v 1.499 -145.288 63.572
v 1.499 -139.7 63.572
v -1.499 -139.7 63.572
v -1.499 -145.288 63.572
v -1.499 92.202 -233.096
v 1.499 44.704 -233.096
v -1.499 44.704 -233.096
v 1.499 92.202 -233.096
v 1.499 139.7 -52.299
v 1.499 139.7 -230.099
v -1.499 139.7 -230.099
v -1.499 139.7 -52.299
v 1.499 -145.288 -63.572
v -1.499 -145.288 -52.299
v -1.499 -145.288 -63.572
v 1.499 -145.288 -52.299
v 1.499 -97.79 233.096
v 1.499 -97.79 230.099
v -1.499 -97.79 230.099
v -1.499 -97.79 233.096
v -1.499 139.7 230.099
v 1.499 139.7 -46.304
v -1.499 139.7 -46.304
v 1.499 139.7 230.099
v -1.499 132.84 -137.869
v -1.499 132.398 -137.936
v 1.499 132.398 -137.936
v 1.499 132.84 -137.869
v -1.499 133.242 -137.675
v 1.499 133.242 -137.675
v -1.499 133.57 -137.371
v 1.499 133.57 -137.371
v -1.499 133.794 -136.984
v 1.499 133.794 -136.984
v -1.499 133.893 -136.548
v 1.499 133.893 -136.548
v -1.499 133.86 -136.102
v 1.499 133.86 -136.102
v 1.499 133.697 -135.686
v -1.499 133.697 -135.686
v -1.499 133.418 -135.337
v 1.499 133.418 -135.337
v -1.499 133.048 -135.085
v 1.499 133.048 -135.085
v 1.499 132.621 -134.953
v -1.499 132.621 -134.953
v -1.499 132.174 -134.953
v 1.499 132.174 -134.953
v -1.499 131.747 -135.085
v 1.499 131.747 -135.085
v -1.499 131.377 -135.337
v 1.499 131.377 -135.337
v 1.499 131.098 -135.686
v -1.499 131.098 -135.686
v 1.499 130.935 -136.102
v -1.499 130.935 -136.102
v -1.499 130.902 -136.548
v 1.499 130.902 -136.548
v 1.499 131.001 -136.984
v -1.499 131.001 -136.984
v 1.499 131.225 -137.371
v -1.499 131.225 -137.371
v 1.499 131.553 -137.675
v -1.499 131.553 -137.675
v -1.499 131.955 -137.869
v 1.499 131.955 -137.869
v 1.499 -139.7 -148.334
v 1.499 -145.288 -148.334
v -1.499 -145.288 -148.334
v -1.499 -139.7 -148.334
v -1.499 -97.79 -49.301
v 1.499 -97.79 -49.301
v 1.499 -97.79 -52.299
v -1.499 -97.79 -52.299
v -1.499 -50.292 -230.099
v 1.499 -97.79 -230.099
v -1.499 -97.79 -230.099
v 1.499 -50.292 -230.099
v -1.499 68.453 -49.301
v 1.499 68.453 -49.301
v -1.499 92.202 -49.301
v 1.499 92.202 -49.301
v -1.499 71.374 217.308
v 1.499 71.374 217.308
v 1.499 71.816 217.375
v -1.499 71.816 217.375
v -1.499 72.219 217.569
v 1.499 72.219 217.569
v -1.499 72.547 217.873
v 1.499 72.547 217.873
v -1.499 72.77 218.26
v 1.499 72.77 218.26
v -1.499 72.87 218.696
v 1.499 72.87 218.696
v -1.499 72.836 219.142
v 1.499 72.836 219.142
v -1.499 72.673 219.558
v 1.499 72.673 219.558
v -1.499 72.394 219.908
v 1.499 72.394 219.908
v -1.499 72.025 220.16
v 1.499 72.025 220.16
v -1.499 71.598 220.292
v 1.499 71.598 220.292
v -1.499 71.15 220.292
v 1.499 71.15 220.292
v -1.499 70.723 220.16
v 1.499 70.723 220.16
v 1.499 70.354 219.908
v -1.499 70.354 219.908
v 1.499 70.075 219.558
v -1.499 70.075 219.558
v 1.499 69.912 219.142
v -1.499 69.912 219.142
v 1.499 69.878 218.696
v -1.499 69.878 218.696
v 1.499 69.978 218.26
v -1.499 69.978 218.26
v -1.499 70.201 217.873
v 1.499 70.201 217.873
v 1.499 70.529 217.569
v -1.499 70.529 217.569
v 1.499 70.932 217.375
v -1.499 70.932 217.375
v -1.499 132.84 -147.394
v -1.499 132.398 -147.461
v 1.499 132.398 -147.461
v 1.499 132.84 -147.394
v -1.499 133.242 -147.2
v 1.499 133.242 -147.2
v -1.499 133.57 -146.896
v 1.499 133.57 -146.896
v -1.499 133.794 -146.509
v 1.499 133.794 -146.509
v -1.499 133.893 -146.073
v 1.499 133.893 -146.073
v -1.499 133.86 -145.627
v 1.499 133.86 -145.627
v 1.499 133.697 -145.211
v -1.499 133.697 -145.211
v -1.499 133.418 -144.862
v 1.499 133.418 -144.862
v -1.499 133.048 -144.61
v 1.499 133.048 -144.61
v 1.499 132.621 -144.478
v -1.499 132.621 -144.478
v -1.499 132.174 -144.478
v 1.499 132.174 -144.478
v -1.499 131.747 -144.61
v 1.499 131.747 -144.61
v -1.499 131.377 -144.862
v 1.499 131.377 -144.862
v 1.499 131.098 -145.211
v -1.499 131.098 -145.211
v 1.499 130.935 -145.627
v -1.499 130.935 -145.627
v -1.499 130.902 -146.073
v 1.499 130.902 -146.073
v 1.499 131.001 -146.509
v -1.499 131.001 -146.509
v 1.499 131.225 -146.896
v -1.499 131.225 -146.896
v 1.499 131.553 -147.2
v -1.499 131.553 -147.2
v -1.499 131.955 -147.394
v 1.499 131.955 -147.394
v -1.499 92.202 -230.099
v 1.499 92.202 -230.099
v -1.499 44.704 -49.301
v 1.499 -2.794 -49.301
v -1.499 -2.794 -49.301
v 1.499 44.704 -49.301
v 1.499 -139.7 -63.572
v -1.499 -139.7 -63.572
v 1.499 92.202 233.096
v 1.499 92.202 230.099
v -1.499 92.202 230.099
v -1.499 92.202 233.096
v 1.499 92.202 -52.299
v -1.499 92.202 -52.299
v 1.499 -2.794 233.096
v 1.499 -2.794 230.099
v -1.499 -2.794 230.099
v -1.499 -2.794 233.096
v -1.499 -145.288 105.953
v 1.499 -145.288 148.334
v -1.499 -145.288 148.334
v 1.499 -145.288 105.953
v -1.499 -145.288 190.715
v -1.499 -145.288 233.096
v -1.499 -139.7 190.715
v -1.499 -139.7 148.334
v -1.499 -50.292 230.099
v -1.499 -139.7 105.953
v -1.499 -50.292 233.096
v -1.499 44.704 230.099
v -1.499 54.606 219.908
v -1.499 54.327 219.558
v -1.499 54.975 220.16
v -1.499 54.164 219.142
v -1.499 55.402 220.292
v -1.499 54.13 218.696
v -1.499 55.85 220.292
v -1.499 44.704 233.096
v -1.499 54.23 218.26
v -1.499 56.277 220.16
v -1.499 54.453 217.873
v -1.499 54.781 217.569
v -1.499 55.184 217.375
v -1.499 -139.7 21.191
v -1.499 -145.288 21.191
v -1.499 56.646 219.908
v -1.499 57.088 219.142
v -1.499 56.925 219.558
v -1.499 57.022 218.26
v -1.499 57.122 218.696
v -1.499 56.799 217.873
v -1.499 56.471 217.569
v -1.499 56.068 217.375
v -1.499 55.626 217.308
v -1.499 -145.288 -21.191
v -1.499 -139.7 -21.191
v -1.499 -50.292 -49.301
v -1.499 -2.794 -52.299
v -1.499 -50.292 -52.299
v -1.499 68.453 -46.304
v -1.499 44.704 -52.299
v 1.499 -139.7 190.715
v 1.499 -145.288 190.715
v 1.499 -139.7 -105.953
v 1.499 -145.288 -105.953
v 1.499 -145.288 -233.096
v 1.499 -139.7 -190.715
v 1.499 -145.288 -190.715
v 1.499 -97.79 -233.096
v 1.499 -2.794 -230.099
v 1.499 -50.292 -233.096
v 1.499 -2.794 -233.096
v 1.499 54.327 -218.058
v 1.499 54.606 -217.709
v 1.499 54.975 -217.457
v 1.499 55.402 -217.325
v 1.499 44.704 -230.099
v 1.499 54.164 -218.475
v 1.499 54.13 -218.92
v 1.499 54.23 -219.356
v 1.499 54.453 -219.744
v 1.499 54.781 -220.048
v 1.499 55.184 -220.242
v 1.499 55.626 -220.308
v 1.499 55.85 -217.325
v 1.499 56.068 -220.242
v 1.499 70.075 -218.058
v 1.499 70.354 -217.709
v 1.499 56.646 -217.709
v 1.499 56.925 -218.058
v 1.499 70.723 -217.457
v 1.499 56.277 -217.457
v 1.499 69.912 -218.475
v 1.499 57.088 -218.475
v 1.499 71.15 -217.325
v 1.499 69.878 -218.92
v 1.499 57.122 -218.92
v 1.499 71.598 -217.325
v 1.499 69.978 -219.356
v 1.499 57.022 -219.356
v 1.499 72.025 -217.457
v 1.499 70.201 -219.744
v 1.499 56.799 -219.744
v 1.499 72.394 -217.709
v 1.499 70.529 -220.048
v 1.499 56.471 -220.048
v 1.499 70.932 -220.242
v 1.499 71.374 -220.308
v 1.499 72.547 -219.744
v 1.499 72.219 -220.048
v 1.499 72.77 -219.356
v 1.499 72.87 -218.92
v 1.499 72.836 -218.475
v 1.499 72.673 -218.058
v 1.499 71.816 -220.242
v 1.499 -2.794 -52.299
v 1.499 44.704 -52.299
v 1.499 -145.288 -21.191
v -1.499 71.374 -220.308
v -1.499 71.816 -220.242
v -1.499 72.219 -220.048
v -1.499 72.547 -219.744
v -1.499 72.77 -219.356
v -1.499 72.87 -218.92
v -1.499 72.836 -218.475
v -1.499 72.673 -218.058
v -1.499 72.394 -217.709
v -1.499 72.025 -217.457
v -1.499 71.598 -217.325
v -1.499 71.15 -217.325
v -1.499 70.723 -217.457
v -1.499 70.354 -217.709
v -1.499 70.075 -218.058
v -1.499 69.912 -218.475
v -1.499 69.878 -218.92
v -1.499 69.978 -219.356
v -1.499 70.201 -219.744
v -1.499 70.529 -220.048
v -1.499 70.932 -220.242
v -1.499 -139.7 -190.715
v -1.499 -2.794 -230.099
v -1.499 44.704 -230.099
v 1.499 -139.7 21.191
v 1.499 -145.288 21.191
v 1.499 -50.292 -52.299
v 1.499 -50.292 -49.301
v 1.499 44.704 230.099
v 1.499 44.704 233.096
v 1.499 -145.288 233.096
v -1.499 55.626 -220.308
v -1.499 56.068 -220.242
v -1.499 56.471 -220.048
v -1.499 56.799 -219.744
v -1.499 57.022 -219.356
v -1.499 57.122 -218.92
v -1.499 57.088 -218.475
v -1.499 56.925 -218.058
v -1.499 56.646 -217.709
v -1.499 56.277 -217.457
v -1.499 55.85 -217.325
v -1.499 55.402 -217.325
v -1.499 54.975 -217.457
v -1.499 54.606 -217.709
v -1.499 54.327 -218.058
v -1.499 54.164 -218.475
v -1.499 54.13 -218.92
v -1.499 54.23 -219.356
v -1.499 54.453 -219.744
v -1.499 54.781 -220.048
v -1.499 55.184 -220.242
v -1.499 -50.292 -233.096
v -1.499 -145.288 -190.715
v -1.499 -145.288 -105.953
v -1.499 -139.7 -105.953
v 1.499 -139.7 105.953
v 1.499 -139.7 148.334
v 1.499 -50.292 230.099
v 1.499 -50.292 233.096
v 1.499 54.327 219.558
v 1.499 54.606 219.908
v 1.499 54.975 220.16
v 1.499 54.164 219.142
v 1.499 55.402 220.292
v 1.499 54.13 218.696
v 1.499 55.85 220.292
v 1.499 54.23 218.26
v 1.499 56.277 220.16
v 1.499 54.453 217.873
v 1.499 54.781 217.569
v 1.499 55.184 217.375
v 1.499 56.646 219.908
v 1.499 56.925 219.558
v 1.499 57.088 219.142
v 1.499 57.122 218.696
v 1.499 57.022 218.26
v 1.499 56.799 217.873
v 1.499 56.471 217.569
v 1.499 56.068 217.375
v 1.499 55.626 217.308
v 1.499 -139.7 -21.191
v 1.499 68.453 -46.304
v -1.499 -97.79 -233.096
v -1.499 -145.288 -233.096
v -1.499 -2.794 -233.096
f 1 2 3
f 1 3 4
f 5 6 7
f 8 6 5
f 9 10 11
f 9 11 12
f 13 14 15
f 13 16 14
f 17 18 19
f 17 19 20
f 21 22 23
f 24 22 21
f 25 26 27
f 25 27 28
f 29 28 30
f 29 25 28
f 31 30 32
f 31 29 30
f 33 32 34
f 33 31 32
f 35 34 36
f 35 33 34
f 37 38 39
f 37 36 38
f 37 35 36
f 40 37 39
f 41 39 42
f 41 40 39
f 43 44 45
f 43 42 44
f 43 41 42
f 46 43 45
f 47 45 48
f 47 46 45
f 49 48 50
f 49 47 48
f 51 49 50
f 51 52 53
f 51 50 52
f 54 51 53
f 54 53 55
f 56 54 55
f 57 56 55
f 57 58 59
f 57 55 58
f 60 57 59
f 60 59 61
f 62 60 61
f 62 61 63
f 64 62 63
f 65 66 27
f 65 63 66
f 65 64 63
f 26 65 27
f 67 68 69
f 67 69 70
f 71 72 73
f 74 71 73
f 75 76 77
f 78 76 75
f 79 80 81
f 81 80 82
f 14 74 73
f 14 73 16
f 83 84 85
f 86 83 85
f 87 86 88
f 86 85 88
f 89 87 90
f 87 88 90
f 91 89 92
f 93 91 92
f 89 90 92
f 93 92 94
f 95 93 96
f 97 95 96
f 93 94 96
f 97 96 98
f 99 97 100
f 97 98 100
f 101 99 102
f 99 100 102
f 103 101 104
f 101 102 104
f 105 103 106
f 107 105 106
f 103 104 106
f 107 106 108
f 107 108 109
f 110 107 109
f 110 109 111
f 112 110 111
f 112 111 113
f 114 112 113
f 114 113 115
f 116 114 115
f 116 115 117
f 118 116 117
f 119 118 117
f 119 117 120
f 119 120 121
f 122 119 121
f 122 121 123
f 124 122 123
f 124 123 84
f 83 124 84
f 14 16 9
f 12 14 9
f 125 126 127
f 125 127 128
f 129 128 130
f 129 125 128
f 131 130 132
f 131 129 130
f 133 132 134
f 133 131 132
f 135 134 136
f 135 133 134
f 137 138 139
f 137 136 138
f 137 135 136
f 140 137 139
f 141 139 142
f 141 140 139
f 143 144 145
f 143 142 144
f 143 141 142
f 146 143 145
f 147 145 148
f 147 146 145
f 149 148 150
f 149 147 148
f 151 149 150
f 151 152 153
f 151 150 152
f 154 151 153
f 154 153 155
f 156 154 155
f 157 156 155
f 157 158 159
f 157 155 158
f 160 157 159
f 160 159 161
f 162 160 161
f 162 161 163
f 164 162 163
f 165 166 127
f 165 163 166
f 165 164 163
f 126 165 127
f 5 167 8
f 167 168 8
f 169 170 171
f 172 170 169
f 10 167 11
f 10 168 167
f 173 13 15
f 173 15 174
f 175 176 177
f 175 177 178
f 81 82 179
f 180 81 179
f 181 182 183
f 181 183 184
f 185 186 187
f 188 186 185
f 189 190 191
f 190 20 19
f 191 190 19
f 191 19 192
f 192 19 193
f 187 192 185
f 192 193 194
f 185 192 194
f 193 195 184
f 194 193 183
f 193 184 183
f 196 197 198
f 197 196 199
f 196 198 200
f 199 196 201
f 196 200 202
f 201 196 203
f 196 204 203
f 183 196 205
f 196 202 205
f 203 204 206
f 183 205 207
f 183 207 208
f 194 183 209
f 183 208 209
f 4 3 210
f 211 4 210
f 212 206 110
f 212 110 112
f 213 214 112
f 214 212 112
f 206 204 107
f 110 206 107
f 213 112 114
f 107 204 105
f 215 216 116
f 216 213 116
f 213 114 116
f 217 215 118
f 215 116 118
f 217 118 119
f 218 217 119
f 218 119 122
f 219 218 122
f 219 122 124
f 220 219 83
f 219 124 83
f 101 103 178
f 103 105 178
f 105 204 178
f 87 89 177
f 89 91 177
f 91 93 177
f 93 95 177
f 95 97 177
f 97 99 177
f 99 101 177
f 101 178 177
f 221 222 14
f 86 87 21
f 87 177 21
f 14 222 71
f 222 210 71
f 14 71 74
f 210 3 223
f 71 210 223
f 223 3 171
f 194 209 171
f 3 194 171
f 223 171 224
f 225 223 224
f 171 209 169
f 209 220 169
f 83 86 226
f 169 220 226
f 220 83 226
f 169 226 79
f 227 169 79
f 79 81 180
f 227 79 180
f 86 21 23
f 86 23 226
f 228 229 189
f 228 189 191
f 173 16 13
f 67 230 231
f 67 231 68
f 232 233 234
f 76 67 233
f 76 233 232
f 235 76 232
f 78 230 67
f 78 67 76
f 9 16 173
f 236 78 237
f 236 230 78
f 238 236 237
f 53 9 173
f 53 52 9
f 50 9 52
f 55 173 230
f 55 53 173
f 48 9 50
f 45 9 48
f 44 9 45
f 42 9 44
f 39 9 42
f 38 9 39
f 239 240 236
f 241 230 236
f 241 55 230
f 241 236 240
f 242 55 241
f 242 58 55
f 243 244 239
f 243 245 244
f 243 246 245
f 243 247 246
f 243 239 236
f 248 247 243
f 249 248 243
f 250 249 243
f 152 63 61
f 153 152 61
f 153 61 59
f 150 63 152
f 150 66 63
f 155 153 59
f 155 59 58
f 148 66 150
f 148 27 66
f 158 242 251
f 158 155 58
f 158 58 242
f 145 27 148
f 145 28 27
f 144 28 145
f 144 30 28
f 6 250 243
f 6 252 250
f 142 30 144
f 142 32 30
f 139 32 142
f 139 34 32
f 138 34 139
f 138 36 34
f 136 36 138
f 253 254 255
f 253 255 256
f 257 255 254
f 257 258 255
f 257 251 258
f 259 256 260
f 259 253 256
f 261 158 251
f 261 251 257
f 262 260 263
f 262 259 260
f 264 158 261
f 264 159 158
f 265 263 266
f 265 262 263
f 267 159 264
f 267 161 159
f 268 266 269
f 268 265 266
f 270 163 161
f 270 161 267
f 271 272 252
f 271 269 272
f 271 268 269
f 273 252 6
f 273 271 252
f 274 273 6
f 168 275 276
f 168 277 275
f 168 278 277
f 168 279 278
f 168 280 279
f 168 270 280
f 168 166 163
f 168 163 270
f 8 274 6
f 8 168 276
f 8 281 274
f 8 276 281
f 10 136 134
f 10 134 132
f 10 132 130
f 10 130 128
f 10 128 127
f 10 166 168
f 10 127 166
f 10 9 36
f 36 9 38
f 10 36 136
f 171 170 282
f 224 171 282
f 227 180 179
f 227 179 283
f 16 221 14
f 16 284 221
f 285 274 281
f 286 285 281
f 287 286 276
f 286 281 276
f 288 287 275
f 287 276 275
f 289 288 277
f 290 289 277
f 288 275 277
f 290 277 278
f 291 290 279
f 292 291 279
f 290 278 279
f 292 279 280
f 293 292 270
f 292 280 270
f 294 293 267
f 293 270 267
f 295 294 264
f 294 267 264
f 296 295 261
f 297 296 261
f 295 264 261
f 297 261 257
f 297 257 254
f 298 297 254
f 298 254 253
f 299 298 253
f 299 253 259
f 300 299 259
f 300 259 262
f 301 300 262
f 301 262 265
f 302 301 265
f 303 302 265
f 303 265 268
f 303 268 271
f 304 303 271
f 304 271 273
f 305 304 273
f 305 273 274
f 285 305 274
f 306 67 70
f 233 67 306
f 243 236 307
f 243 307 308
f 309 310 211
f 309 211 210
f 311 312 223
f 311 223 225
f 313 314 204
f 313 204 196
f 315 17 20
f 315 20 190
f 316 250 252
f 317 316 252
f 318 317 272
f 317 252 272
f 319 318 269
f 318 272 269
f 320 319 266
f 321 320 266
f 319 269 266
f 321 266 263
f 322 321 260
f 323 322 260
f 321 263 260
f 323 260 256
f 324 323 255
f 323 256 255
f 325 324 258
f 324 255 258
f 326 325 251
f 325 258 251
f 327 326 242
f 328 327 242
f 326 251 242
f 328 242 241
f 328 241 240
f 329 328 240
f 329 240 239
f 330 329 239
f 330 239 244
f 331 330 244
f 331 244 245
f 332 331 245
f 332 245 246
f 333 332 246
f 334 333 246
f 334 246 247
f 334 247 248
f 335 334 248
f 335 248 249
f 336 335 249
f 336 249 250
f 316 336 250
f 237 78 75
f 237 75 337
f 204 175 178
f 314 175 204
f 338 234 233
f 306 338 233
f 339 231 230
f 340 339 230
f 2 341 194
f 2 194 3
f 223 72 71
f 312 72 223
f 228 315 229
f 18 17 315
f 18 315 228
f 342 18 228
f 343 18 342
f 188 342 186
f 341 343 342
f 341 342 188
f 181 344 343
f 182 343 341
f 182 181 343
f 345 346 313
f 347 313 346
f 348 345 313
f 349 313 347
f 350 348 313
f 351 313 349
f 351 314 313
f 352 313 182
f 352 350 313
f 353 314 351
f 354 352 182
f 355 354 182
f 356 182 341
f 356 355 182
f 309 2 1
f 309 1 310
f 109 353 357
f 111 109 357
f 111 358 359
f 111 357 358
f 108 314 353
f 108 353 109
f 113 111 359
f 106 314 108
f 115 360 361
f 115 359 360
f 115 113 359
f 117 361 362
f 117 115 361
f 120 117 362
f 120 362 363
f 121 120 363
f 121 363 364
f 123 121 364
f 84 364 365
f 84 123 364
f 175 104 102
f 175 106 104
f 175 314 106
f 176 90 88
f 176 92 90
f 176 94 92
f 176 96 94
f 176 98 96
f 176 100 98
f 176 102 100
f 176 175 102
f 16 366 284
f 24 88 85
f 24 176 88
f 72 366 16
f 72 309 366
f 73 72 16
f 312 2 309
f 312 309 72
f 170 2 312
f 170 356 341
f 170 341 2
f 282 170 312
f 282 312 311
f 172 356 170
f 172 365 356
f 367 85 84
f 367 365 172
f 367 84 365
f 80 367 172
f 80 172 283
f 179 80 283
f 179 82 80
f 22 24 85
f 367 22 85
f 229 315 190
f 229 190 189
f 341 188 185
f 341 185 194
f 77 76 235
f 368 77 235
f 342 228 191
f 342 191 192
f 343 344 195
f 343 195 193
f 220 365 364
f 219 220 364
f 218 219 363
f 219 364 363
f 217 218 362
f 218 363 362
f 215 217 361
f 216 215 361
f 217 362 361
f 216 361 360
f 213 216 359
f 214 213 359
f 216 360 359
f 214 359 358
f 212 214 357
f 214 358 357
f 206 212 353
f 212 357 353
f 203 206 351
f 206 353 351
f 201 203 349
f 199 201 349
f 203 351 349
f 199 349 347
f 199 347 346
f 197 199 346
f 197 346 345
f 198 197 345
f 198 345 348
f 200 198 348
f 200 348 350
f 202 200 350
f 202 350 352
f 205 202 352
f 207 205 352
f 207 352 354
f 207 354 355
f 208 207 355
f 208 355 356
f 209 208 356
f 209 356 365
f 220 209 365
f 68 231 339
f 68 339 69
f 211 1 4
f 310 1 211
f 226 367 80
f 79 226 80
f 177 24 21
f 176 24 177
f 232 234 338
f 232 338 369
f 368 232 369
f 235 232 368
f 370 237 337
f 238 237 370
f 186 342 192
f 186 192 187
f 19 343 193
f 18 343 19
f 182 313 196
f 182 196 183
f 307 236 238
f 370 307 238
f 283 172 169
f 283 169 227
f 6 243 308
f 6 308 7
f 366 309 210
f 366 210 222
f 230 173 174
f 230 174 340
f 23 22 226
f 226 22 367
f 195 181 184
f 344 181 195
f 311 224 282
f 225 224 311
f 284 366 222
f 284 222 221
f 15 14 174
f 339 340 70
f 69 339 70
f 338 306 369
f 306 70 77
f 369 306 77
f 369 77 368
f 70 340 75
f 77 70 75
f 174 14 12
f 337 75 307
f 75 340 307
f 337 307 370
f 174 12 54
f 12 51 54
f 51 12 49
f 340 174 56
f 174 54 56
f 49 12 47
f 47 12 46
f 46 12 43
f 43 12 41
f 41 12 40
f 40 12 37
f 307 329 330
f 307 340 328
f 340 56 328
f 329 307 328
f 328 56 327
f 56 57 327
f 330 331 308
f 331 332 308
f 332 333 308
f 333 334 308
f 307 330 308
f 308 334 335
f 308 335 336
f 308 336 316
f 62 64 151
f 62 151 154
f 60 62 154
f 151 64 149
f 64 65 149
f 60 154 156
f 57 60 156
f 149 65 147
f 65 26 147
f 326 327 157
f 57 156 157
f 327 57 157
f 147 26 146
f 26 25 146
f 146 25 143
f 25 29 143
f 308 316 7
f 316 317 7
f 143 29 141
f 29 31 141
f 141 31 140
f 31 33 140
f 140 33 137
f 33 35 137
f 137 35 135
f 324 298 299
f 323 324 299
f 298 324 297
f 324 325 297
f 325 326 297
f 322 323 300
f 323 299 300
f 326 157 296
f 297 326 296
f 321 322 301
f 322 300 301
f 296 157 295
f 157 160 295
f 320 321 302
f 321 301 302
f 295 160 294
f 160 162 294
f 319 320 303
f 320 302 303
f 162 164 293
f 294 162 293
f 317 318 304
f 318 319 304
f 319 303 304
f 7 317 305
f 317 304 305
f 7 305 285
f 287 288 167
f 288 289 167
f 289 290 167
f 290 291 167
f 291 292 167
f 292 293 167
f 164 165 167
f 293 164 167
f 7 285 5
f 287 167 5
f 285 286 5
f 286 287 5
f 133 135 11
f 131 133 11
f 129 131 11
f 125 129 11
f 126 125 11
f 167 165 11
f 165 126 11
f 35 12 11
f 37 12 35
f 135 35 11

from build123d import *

# Parameters (mm, degrees)
BOSS_EXTRUDE1_DEPTH     = 1.4986
SKETCH1_3_W             = 11.272981818
SKETCH1_3_H             = 5.588
SKETCH1_3_W_2           = 42.381054545
SKETCH1_3_W_3           = 39.383854545
SKETCH1_3_W_4           = 2.9972
SKETCH1_3_H_2           = 41.91
SKETCH1_3_H_3           = 47.498
BOSS_EXTRUDE2_DEPTH     = 1.4986
SKETCH4_W               = 2.9972
SKETCH4_H               = 47.498
SKETCH4_H_2             = 23.749
CUT_EXTRUDE1_DEPTH      = 275.683887641
SKETCH9_R               = 1.5
CUT_EXTRUDE4_DEPTH      = 275.683887641
CUT_EXTRUDE5_DEPTH      = 275.671623441
CUT_EXTRUDE5_DEPTH_BACK = 275.671623441
SKETCH10_R              = 1.5
SPLIT1_SURFACE_1_BACK   = 547.408
SPLIT1_SURFACE_1_DEPTH  = 1094.816
SPLIT1_SURFACE_2_BACK   = 547.408
SPLIT1_SURFACE_2_DEPTH  = 1094.816


with BuildPart() as part:
    # Sketch1 → Boss-Extrude1 (new, symmetric)
    with BuildSketch(Plane(origin=(0, 0, 0), x_dir=(0, 0, -1), z_dir=(1, 0, 0))):
        Polygon((-230.0986, 139.7), (-230.0986, 92.202), (-233.0958, 92.202), (-233.0958, 44.704), (-230.0986, 44.704), (-230.0986, -2.794), (-233.0958, -2.794), (-233.0958, -50.292), (-230.0986, -50.292), (-230.0986, -97.79), (-233.0958, -97.79), (-233.0958, -145.288), (-190.714745455, -145.288), (-190.714745455, -139.7), (-148.333690909, -139.7), (-148.333690909, -145.288), (-105.952636364, -145.288), (-105.952636364, -139.7), (-63.571581818, -139.7), (-63.571581818, -145.288), (-21.190527273, -145.288), (-21.190527273, -139.7), (21.190527273, -139.7), (21.190527273, -145.288), (52.2986, -145.288), (52.2986, 139.7), align=None)
    extrude(amount=BOSS_EXTRUDE1_DEPTH, both=True)

    # Sketch1<3> → Boss-Extrude2 (add, symmetric)
    with BuildSketch(Plane(origin=(0, 0, 0), x_dir=(0, 0, -1), z_dir=(1, 0, 0))):
        Polygon((230.0986, 139.7), (52.2986, 139.7), (52.2986, -139.7), (63.571581818, -139.7), (105.952636364, -139.7), (148.333690909, -139.7), (190.714745455, -139.7), (230.0986, -139.7), (230.0986, -97.79), (230.0986, -50.292), (230.0986, -2.794), (230.0986, 44.704), (230.0986, 92.202), align=None)
        with Locations((57.935090909, -142.494)):
            Rectangle(SKETCH1_3_W, SKETCH1_3_H)
        with Locations((127.143163637, -142.494)):
            Rectangle(SKETCH1_3_W_2, SKETCH1_3_H)
        with Locations((210.406672727, -142.494)):
            Rectangle(SKETCH1_3_W_3, SKETCH1_3_H)
        with Locations((231.5972, -142.494)):
            Rectangle(SKETCH1_3_W_4, SKETCH1_3_H)
        with Locations((231.5972, -118.745)):
            Rectangle(SKETCH1_3_W_4, SKETCH1_3_H_2)
        with Locations((231.5972, -26.543)):
            Rectangle(SKETCH1_3_W_4, SKETCH1_3_H_3)
        with Locations((231.5972, 68.453)):
            Rectangle(SKETCH1_3_W_4, SKETCH1_3_H_3)
    extrude(amount=BOSS_EXTRUDE2_DEPTH, both=True)

    # Sketch4 → Cut-Extrude1 (cut, through all)
    with BuildSketch(Plane(origin=(1.4986, 0, 0), x_dir=(0, 0, -1), z_dir=(1, 0, 0))):
        with Locations((50.8, 20.955)):
            Rectangle(SKETCH4_W, SKETCH4_H)
        with Locations((50.8, -74.041)):
            Rectangle(SKETCH4_W, SKETCH4_H)
        with Locations((50.8, 115.951)):
            Rectangle(SKETCH4_W, SKETCH4_H)
        with Locations((47.8028, 115.951)):
            Rectangle(SKETCH4_W, SKETCH4_H)
        with Locations((47.8028, 80.3275)):
            Rectangle(SKETCH4_W, SKETCH4_H_2)
    extrude(amount=-CUT_EXTRUDE1_DEPTH, mode=Mode.SUBTRACT)

    # Sketch9 → Cut-Extrude4 (cut, through all)
    with BuildSketch(Plane(origin=(1.4986, 0, 0), x_dir=(0, 0, -1), z_dir=(1, 0, 0))):
        with Locations((-218.8083, 71.374)):
            Circle(SKETCH9_R)
        with Locations((-218.8083, 55.626)):
            Circle(SKETCH9_R)
        with Locations((218.8083, 71.374)):
            Circle(SKETCH9_R)
        with Locations((218.8083, 55.626)):
            Circle(SKETCH9_R)
    extrude(amount=-CUT_EXTRUDE4_DEPTH, mode=Mode.SUBTRACT)

    # Sketch10 → Cut-Extrude5 (cut, two sides: drawn at the far end of the back side and taken through both)
    with BuildSketch(Plane(origin=(0, 0, 0), x_dir=(0, 0, -1), z_dir=(1, 0, 0)).offset(-CUT_EXTRUDE5_DEPTH_BACK)):
        with Locations((145.9611, 132.3975)):
            Circle(SKETCH10_R)
        with Locations((136.4361, 132.3975)):
            Circle(SKETCH10_R)
    extrude(amount=CUT_EXTRUDE5_DEPTH + CUT_EXTRUDE5_DEPTH_BACK, mode=Mode.SUBTRACT)


with BuildPart() as body_2:
    # Split1: the piece behind the surface
    add(part.part)
    # Split1 surface: a surface, the sketch's curves swept straight by 1094.816 mm
    with BuildLine(Plane(origin=(1.4986, 0, 0), x_dir=(0, 0, -1), z_dir=(1, 0, 0)).offset(-SPLIT1_SURFACE_1_BACK), mode=Mode.PRIVATE) as split1_surface_1_path:
        Line((52.2986, 139.7), (52.2986, -145.288))
    split1_surface_1 = Shell.extrude(split1_surface_1_path.wire(), (1 * SPLIT1_SURFACE_1_DEPTH, 0 * SPLIT1_SURFACE_1_DEPTH, 0 * SPLIT1_SURFACE_1_DEPTH))
    split(bisect_by=split1_surface_1, keep=Keep.BOTTOM)


with BuildPart() as part_1:
    add(part.part)

    # Split1: split by a surface, the side it looks to stays
    # Split1 surface: a surface, the sketch's curves swept straight by 1094.816 mm
    with BuildLine(Plane(origin=(1.4986, 0, 0), x_dir=(0, 0, -1), z_dir=(1, 0, 0)).offset(-SPLIT1_SURFACE_2_BACK), mode=Mode.PRIVATE) as split1_surface_2_path:
        Line((52.2986, 139.7), (52.2986, -145.288))
    split1_surface_2 = Shell.extrude(split1_surface_2_path.wire(), (1 * SPLIT1_SURFACE_2_DEPTH, 0 * SPLIT1_SURFACE_2_DEPTH, 0 * SPLIT1_SURFACE_2_DEPTH))
    split(bisect_by=split1_surface_2, keep=Keep.TOP)


solid = Compound([body_2.part, part_1.part])
